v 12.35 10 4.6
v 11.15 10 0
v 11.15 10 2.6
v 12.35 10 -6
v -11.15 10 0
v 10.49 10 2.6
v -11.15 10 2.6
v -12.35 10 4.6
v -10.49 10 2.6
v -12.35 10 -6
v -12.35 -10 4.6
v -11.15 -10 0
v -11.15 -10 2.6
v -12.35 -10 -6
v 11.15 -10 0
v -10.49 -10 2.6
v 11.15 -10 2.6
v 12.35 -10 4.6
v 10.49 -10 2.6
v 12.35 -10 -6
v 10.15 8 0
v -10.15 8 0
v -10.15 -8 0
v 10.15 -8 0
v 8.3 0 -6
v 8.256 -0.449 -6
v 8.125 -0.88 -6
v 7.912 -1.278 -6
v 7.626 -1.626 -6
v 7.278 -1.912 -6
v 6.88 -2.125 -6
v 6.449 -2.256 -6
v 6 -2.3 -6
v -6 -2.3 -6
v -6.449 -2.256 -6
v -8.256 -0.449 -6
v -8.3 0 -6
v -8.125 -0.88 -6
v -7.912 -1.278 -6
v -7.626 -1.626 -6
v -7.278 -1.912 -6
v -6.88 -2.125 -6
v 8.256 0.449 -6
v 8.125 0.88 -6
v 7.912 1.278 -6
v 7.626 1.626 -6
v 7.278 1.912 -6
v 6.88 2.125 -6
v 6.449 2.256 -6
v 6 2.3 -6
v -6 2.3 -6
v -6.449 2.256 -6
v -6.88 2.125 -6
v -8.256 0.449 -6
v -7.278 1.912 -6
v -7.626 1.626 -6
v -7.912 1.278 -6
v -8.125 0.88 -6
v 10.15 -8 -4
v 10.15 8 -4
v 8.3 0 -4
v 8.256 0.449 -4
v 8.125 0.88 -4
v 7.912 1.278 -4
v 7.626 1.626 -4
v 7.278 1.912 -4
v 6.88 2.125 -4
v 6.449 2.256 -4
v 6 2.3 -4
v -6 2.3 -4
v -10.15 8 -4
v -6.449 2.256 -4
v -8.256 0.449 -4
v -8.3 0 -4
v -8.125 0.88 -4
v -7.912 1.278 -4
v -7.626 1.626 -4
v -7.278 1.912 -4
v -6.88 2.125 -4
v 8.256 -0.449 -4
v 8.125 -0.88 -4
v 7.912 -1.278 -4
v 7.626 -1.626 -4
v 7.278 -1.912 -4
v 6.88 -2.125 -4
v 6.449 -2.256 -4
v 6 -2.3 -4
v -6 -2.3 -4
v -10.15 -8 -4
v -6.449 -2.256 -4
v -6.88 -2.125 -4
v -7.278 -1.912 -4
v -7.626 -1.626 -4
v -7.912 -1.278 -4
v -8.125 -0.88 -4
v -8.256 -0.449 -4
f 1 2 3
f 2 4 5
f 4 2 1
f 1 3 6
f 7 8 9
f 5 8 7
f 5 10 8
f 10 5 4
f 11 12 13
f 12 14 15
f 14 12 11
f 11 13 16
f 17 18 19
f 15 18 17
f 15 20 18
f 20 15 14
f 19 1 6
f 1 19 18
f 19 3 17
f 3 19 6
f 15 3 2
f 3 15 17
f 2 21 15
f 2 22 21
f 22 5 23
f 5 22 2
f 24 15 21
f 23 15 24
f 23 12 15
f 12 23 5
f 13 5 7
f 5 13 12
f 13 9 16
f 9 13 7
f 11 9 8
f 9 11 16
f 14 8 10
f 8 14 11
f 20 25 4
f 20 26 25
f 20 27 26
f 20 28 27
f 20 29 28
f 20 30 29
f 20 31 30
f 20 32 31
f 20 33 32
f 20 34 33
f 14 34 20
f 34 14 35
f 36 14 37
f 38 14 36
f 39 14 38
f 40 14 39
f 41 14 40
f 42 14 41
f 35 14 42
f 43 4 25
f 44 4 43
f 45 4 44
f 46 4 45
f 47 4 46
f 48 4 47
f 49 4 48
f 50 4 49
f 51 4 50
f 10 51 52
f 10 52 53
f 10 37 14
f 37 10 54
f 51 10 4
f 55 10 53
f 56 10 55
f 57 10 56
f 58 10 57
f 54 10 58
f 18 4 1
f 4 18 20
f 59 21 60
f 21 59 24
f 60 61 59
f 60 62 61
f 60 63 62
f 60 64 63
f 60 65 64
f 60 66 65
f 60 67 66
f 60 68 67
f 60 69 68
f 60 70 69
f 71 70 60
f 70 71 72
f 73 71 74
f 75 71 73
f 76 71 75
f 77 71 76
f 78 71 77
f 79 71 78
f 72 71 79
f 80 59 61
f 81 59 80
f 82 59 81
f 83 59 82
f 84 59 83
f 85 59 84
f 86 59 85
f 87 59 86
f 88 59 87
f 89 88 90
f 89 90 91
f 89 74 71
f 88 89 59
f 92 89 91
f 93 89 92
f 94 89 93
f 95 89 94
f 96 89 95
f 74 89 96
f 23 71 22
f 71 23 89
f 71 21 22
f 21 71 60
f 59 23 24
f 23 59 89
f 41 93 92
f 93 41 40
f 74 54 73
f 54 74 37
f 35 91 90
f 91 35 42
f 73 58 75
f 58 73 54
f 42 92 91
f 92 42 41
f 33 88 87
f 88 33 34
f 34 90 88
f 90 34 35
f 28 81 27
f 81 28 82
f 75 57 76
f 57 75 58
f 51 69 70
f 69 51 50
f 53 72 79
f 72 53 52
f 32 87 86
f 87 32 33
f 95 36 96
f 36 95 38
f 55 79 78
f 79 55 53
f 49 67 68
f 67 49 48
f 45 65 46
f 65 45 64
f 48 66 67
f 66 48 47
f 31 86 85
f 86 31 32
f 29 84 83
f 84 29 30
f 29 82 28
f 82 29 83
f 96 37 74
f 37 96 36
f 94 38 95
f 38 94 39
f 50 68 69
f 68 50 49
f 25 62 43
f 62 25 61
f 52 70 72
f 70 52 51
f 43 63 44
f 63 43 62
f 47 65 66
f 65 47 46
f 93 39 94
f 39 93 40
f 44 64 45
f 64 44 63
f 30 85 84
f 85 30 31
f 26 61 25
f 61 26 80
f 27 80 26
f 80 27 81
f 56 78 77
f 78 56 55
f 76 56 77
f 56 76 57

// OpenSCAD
$fn=32;
width = 20;
channel_width = 22.3;
latch_height = 2;
overhang = 0.66;
wall_thickness = 2.6;
box_thickness = 6;
bottom_thickness = 2;
screw_hole_radius = 2.3;
screw_hole_width = 12;

outer_x = channel_width/2 + 1.2;

difference() {
  rotate([90,0,0])
  translate([0, 0, -width/2])
  linear_extrude(width)
  polygon([
    [-outer_x, -box_thickness],
    [-outer_x, wall_thickness + latch_height],
    [-channel_width/2 + overhang, wall_thickness],
    [-channel_width/2, wall_thickness],
    [-channel_width/2, 0],
    [channel_width/2, 0],
    [channel_width/2, wall_thickness],
    [channel_width/2 - overhang, wall_thickness],
    [outer_x, wall_thickness + latch_height],
    [outer_x, -box_thickness],
  ]);
    
  translate([0, 0, -box_thickness/2 + bottom_thickness])
  cube([channel_width - 2, width - 4, box_thickness], center=true);


  translate([0, 0, -box_thickness - 1])
  hull() {
    translate([screw_hole_width/2, 0, 0])
    cylinder(h=bottom_thickness+2, r=screw_hole_radius);
    translate([-screw_hole_width/2, 0, 0])
    cylinder(h=bottom_thickness+2, r=screw_hole_radius);
  }
}
